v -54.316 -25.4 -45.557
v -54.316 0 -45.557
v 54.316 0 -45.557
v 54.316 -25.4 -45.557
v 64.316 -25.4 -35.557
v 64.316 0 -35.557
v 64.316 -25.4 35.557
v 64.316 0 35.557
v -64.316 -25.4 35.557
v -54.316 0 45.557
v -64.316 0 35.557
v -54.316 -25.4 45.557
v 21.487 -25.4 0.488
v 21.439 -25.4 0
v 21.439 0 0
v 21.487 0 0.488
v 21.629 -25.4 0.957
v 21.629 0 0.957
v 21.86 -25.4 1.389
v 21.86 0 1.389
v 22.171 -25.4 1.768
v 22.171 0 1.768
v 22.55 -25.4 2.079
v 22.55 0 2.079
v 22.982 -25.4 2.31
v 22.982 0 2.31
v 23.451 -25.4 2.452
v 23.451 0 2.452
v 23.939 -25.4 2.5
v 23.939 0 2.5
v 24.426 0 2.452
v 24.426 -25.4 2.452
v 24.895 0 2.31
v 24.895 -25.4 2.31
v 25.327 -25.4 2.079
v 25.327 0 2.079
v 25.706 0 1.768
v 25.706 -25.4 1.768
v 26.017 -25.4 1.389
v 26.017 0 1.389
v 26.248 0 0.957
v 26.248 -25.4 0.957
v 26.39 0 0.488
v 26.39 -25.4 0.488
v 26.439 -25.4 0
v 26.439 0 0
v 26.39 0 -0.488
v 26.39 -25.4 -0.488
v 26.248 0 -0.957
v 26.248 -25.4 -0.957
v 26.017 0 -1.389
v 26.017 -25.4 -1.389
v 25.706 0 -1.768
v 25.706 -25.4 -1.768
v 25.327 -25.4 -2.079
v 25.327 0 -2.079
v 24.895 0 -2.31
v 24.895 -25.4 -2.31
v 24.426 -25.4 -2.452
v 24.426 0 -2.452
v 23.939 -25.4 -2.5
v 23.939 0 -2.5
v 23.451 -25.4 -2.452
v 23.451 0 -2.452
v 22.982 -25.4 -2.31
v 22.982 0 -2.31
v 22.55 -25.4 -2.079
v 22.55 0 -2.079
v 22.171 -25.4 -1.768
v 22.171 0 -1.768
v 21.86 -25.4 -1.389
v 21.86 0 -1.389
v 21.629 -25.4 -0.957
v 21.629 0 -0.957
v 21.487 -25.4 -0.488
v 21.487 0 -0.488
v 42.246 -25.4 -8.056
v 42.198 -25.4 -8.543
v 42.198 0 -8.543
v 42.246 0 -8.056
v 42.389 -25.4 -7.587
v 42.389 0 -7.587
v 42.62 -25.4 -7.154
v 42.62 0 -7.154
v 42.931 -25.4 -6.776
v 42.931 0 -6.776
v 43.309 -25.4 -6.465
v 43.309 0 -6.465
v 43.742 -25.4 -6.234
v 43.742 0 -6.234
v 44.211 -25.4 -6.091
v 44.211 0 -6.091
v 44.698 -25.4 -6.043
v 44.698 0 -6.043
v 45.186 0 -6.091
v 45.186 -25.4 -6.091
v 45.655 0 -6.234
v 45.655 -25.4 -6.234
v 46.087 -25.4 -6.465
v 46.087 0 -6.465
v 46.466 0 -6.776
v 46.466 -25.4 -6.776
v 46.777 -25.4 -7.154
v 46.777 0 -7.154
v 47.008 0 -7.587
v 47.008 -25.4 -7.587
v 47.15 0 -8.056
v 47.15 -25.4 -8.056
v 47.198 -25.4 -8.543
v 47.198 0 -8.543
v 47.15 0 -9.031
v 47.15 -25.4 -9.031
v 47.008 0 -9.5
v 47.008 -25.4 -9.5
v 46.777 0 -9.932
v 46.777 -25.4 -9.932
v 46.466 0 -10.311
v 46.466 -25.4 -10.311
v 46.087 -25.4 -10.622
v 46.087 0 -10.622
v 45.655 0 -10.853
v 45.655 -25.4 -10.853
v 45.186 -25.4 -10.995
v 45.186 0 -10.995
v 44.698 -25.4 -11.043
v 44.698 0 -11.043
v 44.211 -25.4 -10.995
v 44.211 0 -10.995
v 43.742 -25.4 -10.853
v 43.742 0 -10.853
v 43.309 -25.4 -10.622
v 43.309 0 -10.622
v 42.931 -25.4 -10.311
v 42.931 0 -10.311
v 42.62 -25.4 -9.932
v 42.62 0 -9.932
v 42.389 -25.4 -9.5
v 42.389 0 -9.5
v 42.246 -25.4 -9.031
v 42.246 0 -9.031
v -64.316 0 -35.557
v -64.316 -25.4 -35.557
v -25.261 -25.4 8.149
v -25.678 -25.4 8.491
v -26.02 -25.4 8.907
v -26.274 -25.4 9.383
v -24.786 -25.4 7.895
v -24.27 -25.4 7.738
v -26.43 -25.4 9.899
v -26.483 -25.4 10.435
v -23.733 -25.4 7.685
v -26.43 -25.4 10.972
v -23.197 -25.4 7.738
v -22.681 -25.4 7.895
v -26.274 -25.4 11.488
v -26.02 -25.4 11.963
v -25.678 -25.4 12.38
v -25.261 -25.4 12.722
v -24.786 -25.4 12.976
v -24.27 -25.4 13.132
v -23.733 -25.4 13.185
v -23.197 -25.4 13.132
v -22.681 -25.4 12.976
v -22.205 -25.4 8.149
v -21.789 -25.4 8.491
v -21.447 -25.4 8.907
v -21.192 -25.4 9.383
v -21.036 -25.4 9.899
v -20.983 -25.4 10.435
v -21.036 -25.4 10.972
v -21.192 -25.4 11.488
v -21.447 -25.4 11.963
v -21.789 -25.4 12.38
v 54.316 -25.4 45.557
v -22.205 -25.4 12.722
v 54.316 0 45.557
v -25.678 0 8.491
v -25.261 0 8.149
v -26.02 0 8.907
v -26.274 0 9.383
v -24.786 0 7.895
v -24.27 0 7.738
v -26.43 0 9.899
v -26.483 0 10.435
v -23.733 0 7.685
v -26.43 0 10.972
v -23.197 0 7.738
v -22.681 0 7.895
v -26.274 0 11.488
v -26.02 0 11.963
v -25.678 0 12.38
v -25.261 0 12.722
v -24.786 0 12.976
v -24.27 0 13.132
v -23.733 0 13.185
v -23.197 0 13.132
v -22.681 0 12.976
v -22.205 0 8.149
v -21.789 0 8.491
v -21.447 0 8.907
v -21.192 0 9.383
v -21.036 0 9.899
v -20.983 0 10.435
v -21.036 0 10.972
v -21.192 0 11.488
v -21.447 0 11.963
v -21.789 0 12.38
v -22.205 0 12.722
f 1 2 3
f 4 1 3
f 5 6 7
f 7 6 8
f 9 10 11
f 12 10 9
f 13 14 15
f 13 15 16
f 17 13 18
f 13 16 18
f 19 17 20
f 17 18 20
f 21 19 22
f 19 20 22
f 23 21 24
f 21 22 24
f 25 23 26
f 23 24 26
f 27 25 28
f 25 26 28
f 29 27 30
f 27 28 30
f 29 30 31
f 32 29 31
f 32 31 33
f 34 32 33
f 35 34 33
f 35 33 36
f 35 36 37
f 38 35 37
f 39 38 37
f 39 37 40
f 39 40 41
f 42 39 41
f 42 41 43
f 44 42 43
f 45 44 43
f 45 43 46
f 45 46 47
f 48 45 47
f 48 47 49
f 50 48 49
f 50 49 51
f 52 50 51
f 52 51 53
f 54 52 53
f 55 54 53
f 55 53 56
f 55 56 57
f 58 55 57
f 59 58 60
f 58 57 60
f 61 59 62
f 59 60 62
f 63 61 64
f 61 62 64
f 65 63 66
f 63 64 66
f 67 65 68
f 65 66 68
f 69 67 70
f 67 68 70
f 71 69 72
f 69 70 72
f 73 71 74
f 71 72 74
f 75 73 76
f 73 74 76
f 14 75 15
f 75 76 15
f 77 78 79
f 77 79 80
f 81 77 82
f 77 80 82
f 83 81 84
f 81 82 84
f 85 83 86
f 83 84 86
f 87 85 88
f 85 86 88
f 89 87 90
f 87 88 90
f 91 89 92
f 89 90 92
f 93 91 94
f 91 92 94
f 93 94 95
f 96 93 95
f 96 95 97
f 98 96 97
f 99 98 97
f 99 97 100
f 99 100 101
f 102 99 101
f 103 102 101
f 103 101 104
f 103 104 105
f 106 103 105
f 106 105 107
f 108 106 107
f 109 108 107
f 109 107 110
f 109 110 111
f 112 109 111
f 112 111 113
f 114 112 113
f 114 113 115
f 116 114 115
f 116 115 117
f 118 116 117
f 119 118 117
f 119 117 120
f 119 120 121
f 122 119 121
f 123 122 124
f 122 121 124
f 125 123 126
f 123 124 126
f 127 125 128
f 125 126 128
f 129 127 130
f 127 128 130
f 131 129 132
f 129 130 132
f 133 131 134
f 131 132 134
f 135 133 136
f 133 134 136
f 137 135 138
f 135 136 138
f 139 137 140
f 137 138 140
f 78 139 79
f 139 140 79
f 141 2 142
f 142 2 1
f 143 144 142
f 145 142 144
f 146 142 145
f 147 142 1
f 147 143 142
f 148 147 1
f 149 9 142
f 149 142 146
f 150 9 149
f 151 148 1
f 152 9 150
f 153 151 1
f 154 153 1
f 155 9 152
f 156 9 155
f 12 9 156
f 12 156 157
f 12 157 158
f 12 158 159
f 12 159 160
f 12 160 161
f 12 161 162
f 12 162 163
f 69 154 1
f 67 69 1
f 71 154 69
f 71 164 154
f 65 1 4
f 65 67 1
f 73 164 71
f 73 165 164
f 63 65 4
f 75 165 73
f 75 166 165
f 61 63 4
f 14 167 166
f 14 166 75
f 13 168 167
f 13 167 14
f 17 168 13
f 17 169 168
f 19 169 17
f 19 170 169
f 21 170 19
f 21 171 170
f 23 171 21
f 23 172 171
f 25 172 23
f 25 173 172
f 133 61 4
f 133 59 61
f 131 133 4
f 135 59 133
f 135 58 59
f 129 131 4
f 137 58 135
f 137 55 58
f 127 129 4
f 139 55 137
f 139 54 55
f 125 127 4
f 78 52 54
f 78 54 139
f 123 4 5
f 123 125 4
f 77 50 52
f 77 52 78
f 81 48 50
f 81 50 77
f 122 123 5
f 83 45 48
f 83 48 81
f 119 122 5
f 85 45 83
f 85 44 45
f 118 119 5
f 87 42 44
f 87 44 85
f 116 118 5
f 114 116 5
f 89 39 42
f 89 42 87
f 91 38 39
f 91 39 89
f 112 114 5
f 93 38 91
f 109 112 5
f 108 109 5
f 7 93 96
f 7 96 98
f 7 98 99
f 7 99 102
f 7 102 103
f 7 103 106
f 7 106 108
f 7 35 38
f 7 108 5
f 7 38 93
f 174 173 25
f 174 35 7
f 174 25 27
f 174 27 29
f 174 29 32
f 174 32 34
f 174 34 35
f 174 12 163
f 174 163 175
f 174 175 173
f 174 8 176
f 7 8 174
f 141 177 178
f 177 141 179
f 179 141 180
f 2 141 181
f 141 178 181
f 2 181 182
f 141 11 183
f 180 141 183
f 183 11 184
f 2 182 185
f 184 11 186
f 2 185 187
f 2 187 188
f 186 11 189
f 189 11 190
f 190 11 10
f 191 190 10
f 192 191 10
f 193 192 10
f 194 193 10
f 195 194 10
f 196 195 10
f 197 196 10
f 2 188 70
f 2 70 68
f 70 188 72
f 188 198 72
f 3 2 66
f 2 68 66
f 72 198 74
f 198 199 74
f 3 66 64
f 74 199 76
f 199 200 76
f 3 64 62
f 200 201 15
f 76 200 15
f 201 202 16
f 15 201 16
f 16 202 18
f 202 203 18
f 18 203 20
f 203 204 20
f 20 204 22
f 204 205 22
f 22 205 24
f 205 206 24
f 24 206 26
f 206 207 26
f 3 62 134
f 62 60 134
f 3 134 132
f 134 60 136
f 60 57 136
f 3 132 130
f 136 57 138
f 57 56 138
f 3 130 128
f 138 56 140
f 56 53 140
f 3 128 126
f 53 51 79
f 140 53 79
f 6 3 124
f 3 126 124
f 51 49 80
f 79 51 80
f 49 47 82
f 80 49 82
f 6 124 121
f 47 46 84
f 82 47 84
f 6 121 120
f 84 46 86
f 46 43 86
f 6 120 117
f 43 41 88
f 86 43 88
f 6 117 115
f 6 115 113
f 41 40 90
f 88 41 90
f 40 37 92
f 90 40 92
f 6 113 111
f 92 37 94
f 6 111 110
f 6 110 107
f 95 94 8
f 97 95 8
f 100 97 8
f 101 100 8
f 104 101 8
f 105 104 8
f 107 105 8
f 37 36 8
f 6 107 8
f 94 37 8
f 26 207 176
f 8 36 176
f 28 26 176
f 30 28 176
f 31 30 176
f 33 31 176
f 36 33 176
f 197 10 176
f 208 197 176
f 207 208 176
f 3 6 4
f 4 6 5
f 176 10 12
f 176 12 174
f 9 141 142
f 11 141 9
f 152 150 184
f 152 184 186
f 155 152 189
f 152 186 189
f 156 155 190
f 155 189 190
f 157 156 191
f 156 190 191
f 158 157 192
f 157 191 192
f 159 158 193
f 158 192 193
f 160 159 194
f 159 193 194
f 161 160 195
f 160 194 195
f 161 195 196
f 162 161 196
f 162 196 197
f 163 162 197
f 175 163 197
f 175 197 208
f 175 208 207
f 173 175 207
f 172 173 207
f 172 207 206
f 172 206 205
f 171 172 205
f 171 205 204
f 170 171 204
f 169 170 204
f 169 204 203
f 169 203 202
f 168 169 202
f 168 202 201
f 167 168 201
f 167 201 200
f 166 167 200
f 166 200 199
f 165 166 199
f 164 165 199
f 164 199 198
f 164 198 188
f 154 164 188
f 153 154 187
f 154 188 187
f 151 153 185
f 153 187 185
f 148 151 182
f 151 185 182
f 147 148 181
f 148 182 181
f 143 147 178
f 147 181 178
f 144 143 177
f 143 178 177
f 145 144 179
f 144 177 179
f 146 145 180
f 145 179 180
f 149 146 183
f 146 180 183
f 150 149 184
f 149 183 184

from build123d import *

# Parameters (mm, degrees)
F0_W     = 128.6324560642
F0_H     = 91.1146327853
F1_DEPTH = 25.4
F6_D     = 5
F3_SIZE  = 10
F5_D     = 5.5


with BuildPart() as f1:
    # F0 (on Front) → F1 (new body)
    with BuildSketch(Plane.XZ):
        Rectangle(F0_W, F0_H)
    extrude(amount=F1_DEPTH)

    # F6 (through all)
    with Locations(Plane.XZ.offset(25.4)):
        with Locations((23.9385217428, 0), (44.6983724833, -8.5433870554)):
            Hole(F6_D / 2)

    # F3
    f3_edges = [f1.edges().sort_by_distance(p)[0] for p in [
        (64.316228, -12.7, 45.557316),
        (64.316228, -12.7, -45.557316),
        (-64.316228, -12.7, -45.557316),
        (-64.316228, -12.7, 45.557316),
    ]]
    chamfer(f3_edges, length=F3_SIZE)

    # F5 (through all)
    with Locations(Plane.XZ.offset(25.4)):
        with Locations((-23.7331353128, 10.4352813214)):
            Hole(F5_D / 2)


solid = f1.part
